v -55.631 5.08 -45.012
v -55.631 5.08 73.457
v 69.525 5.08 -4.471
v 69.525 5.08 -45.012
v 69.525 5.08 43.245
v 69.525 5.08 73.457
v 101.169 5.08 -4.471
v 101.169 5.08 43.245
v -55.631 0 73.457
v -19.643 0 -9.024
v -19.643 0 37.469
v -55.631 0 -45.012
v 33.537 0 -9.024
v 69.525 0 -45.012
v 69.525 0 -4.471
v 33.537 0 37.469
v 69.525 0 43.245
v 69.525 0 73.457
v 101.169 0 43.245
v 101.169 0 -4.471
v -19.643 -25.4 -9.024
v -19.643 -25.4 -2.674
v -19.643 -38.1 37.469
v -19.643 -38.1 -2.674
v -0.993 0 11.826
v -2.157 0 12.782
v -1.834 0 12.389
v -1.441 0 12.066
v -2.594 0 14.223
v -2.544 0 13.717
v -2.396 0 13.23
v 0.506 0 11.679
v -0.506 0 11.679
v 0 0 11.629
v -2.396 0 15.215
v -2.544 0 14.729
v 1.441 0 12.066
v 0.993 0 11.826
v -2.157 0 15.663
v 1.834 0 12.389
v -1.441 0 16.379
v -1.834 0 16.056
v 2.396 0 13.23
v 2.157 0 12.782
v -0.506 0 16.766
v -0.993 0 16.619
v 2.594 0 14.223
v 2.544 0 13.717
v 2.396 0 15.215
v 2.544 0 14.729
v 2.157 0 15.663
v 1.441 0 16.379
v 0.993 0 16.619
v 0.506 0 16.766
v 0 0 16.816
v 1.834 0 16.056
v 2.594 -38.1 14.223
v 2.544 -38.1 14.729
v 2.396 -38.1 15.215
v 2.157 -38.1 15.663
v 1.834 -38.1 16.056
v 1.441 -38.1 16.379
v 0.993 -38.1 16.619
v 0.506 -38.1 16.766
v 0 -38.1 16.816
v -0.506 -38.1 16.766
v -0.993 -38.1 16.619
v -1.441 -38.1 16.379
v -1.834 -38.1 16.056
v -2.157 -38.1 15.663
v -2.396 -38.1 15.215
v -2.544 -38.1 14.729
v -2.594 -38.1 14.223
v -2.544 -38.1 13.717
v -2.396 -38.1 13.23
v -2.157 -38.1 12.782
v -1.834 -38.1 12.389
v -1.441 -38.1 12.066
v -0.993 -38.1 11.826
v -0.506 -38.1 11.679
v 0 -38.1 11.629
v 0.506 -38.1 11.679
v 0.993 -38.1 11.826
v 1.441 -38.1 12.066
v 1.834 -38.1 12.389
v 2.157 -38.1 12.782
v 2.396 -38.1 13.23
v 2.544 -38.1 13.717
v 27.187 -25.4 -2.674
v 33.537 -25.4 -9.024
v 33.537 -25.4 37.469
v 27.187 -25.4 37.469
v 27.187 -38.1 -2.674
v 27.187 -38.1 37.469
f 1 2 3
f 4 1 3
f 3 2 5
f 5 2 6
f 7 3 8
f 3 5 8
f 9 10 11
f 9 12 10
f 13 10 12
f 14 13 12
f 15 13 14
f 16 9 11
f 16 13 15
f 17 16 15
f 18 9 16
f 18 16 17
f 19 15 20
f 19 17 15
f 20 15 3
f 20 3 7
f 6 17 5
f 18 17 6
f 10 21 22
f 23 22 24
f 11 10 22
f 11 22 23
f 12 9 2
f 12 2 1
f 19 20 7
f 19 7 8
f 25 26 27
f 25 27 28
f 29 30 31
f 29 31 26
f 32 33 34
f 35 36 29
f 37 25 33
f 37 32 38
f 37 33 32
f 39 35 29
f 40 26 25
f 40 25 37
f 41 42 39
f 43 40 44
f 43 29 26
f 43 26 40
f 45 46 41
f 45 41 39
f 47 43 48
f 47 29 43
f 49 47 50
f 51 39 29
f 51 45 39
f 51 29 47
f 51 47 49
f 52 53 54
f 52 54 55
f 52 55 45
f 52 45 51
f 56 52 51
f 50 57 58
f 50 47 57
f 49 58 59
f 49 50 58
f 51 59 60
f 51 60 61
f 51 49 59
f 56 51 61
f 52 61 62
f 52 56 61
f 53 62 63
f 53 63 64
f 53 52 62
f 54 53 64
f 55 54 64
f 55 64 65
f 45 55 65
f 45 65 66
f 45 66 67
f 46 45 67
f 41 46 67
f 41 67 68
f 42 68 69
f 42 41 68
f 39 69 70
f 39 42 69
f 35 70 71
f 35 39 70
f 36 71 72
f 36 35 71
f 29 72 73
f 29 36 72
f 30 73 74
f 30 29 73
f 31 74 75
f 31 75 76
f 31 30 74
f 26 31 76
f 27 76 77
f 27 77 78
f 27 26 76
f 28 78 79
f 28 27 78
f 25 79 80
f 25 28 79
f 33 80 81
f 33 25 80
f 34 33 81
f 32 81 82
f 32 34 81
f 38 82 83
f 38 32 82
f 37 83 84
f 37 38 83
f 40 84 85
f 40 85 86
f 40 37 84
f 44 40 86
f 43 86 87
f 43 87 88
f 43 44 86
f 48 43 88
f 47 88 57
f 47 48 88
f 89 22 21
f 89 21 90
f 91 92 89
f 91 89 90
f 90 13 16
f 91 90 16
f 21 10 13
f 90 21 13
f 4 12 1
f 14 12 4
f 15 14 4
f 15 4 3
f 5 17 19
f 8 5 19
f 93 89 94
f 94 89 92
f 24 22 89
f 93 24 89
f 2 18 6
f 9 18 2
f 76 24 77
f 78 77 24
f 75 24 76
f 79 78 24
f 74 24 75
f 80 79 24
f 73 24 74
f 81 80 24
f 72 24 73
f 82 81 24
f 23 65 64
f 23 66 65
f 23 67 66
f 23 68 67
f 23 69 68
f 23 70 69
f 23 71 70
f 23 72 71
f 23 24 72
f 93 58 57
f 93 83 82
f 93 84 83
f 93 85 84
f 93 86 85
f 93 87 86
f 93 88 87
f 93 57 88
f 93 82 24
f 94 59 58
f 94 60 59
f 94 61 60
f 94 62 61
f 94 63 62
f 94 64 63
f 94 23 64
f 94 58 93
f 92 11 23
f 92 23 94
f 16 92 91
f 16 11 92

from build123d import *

# Parameters (mm, degrees)
F0_W     = 53.1802996993
F0_H     = 46.4934445918
F0_R     = 2.5936293998
F1_DEPTH = 25.4
F2_W     = 46.8302996993
F2_H     = 40.1434445918
F2_R     = 2.5936293998
F3_DEPTH = 12.7
F4_W     = 31.6434130073
F4_H     = 47.7159637958
F4_W_2   = 96.1484760046
F5_DEPTH = 5.08
F4_W_3   = 7.8468769789
F4_H_2   = 9.7482251003


with BuildPart() as f1:
    # F0 (on Front) → F1 (new body)
    with BuildSketch(Plane.XZ):
        with Locations((6.9469735026, 14.2225120217)):
            Rectangle(F0_W, F0_H)
        with Locations((0, 14.2225120217)):
            Circle(F0_R, mode=Mode.SUBTRACT)
    extrude(amount=F1_DEPTH)

    # F2 (on face) → F3 (join)
    with BuildSketch(Plane.XZ.offset(25.4)):
        with Locations((3.7719735026, 17.3975120217)):
            Rectangle(F2_W, F2_H)
        with Locations((0, 14.2225120217)):
            Circle(F2_R, mode=Mode.SUBTRACT)
    extrude(amount=F3_DEPTH)

    # F4 (on Front) → F5 (join)
    with BuildSketch(Plane.XZ):
        with Locations((85.3468738496, 19.3866211921)):
            Rectangle(F4_W, F4_H)
        Polygon((69.525167346, -45.0122542679), (69.525167346, -4.4713607058), (-26.6233086586, -4.4713607058), (-26.6233086586, 43.24460309), (69.525167346, 43.24460309), (69.525167346, 73.4572783113), (-55.6312203407, 73.4572783113), (-55.6312203407, -45.0122542679), align=None)
        with Locations((21.4509293437, 19.3866211921)):
            Rectangle(F4_W_2, F4_H)
    extrude(amount=-F5_DEPTH)


with BuildPart() as f5:
    # F4 (on Front) → F5, piece 2 (new body)
    with BuildSketch(Plane.XZ):
        with Locations((111.8179112673, 1.5299557708)):
            Rectangle(F4_W_3, F4_H_2)
    extrude(amount=-F5_DEPTH)


solid = f1.part
